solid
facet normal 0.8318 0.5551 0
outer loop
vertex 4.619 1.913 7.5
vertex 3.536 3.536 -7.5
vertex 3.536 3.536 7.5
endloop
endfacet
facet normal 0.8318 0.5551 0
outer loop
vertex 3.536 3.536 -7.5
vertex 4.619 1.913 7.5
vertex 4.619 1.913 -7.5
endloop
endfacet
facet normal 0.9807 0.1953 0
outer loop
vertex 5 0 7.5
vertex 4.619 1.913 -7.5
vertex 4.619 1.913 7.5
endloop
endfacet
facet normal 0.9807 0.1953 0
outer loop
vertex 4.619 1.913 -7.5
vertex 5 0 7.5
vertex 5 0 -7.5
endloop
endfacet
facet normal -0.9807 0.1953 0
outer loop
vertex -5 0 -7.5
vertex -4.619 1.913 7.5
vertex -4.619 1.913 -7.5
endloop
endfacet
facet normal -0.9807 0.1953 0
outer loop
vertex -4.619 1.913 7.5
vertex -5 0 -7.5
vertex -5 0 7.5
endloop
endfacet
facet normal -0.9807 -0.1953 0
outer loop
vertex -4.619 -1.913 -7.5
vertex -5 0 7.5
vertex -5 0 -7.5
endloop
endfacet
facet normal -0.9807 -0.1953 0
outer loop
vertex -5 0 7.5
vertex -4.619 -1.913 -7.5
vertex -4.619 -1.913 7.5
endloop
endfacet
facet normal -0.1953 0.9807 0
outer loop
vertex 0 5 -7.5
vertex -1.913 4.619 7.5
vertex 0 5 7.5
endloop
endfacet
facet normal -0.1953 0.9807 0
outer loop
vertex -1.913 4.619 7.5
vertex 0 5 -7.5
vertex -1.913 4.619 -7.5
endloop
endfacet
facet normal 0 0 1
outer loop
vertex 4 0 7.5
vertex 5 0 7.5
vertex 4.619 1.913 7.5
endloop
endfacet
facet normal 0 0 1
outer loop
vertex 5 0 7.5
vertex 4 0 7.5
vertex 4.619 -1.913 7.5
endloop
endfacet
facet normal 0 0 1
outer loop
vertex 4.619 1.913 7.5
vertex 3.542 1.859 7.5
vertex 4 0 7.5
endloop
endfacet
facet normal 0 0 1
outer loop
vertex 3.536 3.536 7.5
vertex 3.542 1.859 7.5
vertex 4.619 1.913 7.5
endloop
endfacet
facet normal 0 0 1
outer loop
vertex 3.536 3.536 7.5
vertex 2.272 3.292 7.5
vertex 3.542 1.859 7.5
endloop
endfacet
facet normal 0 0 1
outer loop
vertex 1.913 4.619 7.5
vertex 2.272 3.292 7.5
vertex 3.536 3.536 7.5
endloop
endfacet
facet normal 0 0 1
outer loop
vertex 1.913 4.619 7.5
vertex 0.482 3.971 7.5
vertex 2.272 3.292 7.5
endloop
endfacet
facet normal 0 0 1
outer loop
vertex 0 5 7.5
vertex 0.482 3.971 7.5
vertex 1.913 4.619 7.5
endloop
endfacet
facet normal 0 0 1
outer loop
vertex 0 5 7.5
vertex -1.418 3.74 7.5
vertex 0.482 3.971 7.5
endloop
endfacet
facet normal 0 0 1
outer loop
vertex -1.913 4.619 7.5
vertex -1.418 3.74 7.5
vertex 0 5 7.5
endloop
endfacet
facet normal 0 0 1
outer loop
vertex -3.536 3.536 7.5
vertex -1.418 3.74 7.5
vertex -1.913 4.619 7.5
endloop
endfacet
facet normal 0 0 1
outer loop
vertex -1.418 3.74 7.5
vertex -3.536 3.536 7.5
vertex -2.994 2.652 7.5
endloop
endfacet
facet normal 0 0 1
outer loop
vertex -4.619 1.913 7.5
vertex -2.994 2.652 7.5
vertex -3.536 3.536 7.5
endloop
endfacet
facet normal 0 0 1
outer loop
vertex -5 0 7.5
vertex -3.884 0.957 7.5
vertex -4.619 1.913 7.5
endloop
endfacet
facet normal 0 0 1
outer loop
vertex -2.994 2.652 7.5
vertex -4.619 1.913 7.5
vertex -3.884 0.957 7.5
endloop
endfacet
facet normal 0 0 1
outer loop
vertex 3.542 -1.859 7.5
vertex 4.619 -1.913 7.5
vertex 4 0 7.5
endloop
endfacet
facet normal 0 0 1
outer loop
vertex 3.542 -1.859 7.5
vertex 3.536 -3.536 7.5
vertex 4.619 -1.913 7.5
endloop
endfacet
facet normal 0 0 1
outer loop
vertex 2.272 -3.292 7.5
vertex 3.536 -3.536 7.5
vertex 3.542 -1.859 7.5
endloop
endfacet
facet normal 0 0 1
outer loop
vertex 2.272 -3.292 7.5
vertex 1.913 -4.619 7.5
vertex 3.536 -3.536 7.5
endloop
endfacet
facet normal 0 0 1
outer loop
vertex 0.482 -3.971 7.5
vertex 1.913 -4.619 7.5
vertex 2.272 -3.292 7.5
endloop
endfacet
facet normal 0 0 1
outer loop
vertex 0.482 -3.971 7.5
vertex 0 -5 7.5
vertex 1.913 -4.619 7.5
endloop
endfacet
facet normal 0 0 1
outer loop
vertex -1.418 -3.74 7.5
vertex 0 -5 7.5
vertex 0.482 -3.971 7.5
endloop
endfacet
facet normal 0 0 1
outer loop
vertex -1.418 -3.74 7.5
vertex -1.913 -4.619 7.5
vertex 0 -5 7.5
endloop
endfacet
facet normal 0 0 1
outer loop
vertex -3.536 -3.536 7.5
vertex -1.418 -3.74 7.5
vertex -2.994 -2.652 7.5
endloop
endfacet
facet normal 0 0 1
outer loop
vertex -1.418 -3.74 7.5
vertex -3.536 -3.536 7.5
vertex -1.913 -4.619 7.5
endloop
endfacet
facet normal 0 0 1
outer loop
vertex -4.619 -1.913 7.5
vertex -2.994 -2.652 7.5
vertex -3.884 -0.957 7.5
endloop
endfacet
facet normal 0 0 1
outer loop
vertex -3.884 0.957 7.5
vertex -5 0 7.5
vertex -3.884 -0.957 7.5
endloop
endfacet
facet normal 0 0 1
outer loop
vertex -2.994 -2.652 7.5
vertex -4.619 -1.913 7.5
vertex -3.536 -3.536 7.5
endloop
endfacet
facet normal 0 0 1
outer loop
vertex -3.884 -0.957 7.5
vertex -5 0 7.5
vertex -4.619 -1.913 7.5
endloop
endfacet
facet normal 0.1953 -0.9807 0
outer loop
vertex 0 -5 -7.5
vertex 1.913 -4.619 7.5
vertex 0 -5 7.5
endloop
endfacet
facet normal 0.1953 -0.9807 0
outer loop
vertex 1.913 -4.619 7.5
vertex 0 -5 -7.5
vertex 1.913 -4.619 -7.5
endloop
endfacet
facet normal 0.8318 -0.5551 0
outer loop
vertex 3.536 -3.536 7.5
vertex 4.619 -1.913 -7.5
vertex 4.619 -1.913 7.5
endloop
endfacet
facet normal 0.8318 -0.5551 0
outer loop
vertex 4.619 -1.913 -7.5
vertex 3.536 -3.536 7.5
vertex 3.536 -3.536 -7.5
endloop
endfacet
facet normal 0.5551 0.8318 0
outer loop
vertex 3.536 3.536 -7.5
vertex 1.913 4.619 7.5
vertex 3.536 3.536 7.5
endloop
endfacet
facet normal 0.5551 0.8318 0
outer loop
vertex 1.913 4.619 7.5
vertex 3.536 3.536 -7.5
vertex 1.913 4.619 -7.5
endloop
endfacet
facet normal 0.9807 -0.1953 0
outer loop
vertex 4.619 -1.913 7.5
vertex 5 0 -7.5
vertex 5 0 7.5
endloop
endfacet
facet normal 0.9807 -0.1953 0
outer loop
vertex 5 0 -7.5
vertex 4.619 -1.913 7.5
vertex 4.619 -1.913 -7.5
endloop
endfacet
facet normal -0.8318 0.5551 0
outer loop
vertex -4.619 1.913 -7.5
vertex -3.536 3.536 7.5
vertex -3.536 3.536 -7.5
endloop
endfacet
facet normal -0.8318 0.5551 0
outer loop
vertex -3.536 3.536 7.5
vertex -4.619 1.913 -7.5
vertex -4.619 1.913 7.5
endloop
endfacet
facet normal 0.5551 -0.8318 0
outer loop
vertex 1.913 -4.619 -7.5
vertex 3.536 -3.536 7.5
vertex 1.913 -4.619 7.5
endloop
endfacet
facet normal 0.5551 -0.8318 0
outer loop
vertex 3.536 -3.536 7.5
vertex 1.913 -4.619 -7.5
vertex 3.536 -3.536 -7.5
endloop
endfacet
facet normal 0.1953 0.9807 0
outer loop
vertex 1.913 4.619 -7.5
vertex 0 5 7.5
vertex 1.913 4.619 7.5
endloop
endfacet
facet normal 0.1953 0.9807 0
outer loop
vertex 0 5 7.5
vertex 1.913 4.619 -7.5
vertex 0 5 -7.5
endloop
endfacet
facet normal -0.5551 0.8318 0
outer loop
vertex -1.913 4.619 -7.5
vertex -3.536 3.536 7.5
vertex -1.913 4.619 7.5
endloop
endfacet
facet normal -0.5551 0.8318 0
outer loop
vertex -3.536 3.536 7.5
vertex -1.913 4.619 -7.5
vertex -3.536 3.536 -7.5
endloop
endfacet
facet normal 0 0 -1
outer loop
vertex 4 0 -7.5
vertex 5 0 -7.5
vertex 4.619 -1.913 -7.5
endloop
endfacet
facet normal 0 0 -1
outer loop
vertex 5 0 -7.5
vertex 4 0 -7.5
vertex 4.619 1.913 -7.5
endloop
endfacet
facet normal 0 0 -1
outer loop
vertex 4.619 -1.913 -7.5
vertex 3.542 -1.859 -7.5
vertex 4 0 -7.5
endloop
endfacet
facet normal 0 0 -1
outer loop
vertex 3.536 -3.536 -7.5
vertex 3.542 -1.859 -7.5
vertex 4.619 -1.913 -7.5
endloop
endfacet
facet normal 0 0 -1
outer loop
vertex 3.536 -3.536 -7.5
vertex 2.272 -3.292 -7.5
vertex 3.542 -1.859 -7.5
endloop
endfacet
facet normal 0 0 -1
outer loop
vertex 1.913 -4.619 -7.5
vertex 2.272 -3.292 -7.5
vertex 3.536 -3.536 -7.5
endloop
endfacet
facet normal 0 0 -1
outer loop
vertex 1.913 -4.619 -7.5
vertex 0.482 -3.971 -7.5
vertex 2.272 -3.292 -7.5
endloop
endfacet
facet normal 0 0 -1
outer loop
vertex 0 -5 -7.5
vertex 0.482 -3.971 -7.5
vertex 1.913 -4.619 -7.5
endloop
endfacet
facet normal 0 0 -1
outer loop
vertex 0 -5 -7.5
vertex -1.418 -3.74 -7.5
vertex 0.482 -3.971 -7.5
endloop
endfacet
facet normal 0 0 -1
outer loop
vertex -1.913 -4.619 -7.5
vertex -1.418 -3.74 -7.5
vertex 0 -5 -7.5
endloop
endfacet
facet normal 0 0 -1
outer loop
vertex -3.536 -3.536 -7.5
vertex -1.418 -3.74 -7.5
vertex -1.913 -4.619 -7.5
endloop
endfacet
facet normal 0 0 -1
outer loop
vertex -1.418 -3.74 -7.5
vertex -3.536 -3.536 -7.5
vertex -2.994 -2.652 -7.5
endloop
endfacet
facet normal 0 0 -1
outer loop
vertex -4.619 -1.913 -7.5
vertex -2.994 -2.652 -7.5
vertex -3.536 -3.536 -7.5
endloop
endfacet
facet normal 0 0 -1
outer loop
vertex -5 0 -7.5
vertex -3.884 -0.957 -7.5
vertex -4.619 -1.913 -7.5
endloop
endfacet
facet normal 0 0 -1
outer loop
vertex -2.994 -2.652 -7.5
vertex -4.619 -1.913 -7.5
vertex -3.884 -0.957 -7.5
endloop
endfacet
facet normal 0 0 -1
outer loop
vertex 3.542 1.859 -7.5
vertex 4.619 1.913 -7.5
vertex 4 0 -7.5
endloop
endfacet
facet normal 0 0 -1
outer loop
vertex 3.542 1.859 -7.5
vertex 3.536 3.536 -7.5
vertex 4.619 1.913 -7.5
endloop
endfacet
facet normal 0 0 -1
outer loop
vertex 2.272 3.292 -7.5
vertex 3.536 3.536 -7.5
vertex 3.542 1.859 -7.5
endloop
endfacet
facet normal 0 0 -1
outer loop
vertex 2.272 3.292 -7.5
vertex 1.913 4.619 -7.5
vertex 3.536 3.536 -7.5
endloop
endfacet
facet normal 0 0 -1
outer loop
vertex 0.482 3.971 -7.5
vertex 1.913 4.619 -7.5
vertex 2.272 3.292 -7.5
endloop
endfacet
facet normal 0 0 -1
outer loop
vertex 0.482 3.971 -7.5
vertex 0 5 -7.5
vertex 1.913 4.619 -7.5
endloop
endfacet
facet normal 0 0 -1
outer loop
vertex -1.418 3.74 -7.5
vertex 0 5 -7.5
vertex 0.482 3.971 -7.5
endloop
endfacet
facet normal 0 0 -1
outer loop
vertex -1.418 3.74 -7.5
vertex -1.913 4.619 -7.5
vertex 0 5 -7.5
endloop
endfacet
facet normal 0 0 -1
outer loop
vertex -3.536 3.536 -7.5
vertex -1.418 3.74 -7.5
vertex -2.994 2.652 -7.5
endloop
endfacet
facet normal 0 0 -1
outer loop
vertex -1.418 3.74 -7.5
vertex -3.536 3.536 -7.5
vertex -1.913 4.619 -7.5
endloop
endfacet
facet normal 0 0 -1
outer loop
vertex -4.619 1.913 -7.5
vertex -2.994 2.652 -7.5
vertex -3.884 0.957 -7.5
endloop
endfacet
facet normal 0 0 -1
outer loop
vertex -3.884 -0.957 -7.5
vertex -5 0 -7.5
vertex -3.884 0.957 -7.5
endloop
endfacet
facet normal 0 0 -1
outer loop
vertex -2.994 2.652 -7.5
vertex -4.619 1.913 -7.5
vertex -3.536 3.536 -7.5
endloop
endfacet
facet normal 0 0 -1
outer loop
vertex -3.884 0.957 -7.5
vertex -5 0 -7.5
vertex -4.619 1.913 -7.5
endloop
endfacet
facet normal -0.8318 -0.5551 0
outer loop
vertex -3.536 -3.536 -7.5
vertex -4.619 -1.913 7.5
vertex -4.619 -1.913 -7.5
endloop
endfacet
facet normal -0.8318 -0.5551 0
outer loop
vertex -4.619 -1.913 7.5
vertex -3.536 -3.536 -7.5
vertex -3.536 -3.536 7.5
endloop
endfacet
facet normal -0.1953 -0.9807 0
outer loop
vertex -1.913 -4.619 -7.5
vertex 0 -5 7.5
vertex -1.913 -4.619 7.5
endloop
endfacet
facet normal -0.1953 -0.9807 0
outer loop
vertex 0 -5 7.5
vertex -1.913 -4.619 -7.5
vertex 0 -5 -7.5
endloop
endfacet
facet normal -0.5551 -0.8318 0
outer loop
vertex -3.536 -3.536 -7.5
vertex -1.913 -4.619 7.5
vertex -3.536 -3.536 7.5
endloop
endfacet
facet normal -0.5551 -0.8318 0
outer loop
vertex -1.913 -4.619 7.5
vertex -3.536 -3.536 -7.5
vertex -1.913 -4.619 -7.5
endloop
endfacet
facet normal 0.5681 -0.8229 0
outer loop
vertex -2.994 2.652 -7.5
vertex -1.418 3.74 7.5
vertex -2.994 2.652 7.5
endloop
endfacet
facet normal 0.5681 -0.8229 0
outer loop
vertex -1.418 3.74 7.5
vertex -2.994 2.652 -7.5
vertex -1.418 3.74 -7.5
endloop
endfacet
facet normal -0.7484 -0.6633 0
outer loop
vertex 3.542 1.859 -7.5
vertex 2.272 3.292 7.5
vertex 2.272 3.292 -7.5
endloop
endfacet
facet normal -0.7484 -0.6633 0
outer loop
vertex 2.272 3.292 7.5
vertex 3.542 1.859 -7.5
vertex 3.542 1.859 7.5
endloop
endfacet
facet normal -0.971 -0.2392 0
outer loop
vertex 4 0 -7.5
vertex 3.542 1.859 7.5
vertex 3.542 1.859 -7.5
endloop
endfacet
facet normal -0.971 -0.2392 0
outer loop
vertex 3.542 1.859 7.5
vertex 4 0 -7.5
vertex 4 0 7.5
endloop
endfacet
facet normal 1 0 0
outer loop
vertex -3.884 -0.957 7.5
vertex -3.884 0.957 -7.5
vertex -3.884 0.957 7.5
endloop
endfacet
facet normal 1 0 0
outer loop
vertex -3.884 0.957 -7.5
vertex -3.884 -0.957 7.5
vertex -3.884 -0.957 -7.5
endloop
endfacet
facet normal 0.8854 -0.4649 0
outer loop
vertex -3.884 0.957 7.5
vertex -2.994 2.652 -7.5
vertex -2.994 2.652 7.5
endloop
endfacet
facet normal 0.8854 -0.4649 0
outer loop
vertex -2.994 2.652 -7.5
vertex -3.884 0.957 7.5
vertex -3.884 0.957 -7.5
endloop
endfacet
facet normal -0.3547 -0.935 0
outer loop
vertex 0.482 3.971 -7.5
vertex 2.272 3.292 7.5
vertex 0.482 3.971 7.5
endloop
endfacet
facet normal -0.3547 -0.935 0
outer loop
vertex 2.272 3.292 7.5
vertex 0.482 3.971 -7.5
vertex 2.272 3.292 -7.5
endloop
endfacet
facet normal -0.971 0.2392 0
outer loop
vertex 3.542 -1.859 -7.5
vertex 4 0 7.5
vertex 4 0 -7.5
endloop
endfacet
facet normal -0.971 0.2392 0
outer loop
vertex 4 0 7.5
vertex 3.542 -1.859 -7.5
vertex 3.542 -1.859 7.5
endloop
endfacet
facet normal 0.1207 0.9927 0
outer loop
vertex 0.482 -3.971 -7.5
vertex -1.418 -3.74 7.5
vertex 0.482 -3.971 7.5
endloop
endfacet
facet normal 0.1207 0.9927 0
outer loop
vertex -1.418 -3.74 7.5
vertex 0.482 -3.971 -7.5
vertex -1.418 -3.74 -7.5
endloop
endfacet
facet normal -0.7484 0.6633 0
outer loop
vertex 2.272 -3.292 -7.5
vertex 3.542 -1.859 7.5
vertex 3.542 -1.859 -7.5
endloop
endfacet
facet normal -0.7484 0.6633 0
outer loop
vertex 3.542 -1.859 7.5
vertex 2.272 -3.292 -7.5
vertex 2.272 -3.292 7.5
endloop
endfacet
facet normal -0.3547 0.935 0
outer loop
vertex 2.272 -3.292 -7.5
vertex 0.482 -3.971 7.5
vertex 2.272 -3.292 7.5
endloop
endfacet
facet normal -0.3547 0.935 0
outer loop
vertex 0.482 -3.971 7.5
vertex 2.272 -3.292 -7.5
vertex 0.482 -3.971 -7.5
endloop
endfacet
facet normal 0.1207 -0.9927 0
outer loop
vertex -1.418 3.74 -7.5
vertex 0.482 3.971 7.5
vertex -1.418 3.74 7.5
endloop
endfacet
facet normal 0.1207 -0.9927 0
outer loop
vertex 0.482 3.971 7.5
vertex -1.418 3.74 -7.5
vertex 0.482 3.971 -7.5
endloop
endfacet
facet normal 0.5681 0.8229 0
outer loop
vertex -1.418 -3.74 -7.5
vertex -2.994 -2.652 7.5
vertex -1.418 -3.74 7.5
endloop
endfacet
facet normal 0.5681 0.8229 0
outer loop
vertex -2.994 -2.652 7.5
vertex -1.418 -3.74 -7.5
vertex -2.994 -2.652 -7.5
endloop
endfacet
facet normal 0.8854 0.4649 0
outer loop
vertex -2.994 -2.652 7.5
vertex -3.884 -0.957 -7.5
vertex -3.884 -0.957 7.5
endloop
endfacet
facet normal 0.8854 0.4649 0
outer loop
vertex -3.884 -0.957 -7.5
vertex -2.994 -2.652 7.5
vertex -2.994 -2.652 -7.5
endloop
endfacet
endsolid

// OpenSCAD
// Parameters
length = 15; //[8:60:1]
forced_id = 0; //[0:30:0.5]
center = 1; //[0:1:1]
profile_od = 10; //[5:20:0.5]
profile_id = 8; //[3:18:0.5]
eps = 0.8; //[0.2:2:0.1]
id_effective = forced_id > 0 ? forced_id : profile_id; //[0:30:0.5]
z_shift = center ? 0 : length / 2; //[-100:100:1]

// Tubing - complete geometry
module tubing() {
  color([0.15, 0.15, 0.17]) {
    difference() {
      // Outer tube
      cylinder(r=profile_od/2, h=length, center=true);
      // Inner bore
      translate([0, 0, 0])
        cylinder(r=id_effective/2, h=length + 2*eps, center=true);
    }
  }
}

// Assembly
module assembly() {
  translate([0, 0, -z_shift]) tubing();
}

assembly();
